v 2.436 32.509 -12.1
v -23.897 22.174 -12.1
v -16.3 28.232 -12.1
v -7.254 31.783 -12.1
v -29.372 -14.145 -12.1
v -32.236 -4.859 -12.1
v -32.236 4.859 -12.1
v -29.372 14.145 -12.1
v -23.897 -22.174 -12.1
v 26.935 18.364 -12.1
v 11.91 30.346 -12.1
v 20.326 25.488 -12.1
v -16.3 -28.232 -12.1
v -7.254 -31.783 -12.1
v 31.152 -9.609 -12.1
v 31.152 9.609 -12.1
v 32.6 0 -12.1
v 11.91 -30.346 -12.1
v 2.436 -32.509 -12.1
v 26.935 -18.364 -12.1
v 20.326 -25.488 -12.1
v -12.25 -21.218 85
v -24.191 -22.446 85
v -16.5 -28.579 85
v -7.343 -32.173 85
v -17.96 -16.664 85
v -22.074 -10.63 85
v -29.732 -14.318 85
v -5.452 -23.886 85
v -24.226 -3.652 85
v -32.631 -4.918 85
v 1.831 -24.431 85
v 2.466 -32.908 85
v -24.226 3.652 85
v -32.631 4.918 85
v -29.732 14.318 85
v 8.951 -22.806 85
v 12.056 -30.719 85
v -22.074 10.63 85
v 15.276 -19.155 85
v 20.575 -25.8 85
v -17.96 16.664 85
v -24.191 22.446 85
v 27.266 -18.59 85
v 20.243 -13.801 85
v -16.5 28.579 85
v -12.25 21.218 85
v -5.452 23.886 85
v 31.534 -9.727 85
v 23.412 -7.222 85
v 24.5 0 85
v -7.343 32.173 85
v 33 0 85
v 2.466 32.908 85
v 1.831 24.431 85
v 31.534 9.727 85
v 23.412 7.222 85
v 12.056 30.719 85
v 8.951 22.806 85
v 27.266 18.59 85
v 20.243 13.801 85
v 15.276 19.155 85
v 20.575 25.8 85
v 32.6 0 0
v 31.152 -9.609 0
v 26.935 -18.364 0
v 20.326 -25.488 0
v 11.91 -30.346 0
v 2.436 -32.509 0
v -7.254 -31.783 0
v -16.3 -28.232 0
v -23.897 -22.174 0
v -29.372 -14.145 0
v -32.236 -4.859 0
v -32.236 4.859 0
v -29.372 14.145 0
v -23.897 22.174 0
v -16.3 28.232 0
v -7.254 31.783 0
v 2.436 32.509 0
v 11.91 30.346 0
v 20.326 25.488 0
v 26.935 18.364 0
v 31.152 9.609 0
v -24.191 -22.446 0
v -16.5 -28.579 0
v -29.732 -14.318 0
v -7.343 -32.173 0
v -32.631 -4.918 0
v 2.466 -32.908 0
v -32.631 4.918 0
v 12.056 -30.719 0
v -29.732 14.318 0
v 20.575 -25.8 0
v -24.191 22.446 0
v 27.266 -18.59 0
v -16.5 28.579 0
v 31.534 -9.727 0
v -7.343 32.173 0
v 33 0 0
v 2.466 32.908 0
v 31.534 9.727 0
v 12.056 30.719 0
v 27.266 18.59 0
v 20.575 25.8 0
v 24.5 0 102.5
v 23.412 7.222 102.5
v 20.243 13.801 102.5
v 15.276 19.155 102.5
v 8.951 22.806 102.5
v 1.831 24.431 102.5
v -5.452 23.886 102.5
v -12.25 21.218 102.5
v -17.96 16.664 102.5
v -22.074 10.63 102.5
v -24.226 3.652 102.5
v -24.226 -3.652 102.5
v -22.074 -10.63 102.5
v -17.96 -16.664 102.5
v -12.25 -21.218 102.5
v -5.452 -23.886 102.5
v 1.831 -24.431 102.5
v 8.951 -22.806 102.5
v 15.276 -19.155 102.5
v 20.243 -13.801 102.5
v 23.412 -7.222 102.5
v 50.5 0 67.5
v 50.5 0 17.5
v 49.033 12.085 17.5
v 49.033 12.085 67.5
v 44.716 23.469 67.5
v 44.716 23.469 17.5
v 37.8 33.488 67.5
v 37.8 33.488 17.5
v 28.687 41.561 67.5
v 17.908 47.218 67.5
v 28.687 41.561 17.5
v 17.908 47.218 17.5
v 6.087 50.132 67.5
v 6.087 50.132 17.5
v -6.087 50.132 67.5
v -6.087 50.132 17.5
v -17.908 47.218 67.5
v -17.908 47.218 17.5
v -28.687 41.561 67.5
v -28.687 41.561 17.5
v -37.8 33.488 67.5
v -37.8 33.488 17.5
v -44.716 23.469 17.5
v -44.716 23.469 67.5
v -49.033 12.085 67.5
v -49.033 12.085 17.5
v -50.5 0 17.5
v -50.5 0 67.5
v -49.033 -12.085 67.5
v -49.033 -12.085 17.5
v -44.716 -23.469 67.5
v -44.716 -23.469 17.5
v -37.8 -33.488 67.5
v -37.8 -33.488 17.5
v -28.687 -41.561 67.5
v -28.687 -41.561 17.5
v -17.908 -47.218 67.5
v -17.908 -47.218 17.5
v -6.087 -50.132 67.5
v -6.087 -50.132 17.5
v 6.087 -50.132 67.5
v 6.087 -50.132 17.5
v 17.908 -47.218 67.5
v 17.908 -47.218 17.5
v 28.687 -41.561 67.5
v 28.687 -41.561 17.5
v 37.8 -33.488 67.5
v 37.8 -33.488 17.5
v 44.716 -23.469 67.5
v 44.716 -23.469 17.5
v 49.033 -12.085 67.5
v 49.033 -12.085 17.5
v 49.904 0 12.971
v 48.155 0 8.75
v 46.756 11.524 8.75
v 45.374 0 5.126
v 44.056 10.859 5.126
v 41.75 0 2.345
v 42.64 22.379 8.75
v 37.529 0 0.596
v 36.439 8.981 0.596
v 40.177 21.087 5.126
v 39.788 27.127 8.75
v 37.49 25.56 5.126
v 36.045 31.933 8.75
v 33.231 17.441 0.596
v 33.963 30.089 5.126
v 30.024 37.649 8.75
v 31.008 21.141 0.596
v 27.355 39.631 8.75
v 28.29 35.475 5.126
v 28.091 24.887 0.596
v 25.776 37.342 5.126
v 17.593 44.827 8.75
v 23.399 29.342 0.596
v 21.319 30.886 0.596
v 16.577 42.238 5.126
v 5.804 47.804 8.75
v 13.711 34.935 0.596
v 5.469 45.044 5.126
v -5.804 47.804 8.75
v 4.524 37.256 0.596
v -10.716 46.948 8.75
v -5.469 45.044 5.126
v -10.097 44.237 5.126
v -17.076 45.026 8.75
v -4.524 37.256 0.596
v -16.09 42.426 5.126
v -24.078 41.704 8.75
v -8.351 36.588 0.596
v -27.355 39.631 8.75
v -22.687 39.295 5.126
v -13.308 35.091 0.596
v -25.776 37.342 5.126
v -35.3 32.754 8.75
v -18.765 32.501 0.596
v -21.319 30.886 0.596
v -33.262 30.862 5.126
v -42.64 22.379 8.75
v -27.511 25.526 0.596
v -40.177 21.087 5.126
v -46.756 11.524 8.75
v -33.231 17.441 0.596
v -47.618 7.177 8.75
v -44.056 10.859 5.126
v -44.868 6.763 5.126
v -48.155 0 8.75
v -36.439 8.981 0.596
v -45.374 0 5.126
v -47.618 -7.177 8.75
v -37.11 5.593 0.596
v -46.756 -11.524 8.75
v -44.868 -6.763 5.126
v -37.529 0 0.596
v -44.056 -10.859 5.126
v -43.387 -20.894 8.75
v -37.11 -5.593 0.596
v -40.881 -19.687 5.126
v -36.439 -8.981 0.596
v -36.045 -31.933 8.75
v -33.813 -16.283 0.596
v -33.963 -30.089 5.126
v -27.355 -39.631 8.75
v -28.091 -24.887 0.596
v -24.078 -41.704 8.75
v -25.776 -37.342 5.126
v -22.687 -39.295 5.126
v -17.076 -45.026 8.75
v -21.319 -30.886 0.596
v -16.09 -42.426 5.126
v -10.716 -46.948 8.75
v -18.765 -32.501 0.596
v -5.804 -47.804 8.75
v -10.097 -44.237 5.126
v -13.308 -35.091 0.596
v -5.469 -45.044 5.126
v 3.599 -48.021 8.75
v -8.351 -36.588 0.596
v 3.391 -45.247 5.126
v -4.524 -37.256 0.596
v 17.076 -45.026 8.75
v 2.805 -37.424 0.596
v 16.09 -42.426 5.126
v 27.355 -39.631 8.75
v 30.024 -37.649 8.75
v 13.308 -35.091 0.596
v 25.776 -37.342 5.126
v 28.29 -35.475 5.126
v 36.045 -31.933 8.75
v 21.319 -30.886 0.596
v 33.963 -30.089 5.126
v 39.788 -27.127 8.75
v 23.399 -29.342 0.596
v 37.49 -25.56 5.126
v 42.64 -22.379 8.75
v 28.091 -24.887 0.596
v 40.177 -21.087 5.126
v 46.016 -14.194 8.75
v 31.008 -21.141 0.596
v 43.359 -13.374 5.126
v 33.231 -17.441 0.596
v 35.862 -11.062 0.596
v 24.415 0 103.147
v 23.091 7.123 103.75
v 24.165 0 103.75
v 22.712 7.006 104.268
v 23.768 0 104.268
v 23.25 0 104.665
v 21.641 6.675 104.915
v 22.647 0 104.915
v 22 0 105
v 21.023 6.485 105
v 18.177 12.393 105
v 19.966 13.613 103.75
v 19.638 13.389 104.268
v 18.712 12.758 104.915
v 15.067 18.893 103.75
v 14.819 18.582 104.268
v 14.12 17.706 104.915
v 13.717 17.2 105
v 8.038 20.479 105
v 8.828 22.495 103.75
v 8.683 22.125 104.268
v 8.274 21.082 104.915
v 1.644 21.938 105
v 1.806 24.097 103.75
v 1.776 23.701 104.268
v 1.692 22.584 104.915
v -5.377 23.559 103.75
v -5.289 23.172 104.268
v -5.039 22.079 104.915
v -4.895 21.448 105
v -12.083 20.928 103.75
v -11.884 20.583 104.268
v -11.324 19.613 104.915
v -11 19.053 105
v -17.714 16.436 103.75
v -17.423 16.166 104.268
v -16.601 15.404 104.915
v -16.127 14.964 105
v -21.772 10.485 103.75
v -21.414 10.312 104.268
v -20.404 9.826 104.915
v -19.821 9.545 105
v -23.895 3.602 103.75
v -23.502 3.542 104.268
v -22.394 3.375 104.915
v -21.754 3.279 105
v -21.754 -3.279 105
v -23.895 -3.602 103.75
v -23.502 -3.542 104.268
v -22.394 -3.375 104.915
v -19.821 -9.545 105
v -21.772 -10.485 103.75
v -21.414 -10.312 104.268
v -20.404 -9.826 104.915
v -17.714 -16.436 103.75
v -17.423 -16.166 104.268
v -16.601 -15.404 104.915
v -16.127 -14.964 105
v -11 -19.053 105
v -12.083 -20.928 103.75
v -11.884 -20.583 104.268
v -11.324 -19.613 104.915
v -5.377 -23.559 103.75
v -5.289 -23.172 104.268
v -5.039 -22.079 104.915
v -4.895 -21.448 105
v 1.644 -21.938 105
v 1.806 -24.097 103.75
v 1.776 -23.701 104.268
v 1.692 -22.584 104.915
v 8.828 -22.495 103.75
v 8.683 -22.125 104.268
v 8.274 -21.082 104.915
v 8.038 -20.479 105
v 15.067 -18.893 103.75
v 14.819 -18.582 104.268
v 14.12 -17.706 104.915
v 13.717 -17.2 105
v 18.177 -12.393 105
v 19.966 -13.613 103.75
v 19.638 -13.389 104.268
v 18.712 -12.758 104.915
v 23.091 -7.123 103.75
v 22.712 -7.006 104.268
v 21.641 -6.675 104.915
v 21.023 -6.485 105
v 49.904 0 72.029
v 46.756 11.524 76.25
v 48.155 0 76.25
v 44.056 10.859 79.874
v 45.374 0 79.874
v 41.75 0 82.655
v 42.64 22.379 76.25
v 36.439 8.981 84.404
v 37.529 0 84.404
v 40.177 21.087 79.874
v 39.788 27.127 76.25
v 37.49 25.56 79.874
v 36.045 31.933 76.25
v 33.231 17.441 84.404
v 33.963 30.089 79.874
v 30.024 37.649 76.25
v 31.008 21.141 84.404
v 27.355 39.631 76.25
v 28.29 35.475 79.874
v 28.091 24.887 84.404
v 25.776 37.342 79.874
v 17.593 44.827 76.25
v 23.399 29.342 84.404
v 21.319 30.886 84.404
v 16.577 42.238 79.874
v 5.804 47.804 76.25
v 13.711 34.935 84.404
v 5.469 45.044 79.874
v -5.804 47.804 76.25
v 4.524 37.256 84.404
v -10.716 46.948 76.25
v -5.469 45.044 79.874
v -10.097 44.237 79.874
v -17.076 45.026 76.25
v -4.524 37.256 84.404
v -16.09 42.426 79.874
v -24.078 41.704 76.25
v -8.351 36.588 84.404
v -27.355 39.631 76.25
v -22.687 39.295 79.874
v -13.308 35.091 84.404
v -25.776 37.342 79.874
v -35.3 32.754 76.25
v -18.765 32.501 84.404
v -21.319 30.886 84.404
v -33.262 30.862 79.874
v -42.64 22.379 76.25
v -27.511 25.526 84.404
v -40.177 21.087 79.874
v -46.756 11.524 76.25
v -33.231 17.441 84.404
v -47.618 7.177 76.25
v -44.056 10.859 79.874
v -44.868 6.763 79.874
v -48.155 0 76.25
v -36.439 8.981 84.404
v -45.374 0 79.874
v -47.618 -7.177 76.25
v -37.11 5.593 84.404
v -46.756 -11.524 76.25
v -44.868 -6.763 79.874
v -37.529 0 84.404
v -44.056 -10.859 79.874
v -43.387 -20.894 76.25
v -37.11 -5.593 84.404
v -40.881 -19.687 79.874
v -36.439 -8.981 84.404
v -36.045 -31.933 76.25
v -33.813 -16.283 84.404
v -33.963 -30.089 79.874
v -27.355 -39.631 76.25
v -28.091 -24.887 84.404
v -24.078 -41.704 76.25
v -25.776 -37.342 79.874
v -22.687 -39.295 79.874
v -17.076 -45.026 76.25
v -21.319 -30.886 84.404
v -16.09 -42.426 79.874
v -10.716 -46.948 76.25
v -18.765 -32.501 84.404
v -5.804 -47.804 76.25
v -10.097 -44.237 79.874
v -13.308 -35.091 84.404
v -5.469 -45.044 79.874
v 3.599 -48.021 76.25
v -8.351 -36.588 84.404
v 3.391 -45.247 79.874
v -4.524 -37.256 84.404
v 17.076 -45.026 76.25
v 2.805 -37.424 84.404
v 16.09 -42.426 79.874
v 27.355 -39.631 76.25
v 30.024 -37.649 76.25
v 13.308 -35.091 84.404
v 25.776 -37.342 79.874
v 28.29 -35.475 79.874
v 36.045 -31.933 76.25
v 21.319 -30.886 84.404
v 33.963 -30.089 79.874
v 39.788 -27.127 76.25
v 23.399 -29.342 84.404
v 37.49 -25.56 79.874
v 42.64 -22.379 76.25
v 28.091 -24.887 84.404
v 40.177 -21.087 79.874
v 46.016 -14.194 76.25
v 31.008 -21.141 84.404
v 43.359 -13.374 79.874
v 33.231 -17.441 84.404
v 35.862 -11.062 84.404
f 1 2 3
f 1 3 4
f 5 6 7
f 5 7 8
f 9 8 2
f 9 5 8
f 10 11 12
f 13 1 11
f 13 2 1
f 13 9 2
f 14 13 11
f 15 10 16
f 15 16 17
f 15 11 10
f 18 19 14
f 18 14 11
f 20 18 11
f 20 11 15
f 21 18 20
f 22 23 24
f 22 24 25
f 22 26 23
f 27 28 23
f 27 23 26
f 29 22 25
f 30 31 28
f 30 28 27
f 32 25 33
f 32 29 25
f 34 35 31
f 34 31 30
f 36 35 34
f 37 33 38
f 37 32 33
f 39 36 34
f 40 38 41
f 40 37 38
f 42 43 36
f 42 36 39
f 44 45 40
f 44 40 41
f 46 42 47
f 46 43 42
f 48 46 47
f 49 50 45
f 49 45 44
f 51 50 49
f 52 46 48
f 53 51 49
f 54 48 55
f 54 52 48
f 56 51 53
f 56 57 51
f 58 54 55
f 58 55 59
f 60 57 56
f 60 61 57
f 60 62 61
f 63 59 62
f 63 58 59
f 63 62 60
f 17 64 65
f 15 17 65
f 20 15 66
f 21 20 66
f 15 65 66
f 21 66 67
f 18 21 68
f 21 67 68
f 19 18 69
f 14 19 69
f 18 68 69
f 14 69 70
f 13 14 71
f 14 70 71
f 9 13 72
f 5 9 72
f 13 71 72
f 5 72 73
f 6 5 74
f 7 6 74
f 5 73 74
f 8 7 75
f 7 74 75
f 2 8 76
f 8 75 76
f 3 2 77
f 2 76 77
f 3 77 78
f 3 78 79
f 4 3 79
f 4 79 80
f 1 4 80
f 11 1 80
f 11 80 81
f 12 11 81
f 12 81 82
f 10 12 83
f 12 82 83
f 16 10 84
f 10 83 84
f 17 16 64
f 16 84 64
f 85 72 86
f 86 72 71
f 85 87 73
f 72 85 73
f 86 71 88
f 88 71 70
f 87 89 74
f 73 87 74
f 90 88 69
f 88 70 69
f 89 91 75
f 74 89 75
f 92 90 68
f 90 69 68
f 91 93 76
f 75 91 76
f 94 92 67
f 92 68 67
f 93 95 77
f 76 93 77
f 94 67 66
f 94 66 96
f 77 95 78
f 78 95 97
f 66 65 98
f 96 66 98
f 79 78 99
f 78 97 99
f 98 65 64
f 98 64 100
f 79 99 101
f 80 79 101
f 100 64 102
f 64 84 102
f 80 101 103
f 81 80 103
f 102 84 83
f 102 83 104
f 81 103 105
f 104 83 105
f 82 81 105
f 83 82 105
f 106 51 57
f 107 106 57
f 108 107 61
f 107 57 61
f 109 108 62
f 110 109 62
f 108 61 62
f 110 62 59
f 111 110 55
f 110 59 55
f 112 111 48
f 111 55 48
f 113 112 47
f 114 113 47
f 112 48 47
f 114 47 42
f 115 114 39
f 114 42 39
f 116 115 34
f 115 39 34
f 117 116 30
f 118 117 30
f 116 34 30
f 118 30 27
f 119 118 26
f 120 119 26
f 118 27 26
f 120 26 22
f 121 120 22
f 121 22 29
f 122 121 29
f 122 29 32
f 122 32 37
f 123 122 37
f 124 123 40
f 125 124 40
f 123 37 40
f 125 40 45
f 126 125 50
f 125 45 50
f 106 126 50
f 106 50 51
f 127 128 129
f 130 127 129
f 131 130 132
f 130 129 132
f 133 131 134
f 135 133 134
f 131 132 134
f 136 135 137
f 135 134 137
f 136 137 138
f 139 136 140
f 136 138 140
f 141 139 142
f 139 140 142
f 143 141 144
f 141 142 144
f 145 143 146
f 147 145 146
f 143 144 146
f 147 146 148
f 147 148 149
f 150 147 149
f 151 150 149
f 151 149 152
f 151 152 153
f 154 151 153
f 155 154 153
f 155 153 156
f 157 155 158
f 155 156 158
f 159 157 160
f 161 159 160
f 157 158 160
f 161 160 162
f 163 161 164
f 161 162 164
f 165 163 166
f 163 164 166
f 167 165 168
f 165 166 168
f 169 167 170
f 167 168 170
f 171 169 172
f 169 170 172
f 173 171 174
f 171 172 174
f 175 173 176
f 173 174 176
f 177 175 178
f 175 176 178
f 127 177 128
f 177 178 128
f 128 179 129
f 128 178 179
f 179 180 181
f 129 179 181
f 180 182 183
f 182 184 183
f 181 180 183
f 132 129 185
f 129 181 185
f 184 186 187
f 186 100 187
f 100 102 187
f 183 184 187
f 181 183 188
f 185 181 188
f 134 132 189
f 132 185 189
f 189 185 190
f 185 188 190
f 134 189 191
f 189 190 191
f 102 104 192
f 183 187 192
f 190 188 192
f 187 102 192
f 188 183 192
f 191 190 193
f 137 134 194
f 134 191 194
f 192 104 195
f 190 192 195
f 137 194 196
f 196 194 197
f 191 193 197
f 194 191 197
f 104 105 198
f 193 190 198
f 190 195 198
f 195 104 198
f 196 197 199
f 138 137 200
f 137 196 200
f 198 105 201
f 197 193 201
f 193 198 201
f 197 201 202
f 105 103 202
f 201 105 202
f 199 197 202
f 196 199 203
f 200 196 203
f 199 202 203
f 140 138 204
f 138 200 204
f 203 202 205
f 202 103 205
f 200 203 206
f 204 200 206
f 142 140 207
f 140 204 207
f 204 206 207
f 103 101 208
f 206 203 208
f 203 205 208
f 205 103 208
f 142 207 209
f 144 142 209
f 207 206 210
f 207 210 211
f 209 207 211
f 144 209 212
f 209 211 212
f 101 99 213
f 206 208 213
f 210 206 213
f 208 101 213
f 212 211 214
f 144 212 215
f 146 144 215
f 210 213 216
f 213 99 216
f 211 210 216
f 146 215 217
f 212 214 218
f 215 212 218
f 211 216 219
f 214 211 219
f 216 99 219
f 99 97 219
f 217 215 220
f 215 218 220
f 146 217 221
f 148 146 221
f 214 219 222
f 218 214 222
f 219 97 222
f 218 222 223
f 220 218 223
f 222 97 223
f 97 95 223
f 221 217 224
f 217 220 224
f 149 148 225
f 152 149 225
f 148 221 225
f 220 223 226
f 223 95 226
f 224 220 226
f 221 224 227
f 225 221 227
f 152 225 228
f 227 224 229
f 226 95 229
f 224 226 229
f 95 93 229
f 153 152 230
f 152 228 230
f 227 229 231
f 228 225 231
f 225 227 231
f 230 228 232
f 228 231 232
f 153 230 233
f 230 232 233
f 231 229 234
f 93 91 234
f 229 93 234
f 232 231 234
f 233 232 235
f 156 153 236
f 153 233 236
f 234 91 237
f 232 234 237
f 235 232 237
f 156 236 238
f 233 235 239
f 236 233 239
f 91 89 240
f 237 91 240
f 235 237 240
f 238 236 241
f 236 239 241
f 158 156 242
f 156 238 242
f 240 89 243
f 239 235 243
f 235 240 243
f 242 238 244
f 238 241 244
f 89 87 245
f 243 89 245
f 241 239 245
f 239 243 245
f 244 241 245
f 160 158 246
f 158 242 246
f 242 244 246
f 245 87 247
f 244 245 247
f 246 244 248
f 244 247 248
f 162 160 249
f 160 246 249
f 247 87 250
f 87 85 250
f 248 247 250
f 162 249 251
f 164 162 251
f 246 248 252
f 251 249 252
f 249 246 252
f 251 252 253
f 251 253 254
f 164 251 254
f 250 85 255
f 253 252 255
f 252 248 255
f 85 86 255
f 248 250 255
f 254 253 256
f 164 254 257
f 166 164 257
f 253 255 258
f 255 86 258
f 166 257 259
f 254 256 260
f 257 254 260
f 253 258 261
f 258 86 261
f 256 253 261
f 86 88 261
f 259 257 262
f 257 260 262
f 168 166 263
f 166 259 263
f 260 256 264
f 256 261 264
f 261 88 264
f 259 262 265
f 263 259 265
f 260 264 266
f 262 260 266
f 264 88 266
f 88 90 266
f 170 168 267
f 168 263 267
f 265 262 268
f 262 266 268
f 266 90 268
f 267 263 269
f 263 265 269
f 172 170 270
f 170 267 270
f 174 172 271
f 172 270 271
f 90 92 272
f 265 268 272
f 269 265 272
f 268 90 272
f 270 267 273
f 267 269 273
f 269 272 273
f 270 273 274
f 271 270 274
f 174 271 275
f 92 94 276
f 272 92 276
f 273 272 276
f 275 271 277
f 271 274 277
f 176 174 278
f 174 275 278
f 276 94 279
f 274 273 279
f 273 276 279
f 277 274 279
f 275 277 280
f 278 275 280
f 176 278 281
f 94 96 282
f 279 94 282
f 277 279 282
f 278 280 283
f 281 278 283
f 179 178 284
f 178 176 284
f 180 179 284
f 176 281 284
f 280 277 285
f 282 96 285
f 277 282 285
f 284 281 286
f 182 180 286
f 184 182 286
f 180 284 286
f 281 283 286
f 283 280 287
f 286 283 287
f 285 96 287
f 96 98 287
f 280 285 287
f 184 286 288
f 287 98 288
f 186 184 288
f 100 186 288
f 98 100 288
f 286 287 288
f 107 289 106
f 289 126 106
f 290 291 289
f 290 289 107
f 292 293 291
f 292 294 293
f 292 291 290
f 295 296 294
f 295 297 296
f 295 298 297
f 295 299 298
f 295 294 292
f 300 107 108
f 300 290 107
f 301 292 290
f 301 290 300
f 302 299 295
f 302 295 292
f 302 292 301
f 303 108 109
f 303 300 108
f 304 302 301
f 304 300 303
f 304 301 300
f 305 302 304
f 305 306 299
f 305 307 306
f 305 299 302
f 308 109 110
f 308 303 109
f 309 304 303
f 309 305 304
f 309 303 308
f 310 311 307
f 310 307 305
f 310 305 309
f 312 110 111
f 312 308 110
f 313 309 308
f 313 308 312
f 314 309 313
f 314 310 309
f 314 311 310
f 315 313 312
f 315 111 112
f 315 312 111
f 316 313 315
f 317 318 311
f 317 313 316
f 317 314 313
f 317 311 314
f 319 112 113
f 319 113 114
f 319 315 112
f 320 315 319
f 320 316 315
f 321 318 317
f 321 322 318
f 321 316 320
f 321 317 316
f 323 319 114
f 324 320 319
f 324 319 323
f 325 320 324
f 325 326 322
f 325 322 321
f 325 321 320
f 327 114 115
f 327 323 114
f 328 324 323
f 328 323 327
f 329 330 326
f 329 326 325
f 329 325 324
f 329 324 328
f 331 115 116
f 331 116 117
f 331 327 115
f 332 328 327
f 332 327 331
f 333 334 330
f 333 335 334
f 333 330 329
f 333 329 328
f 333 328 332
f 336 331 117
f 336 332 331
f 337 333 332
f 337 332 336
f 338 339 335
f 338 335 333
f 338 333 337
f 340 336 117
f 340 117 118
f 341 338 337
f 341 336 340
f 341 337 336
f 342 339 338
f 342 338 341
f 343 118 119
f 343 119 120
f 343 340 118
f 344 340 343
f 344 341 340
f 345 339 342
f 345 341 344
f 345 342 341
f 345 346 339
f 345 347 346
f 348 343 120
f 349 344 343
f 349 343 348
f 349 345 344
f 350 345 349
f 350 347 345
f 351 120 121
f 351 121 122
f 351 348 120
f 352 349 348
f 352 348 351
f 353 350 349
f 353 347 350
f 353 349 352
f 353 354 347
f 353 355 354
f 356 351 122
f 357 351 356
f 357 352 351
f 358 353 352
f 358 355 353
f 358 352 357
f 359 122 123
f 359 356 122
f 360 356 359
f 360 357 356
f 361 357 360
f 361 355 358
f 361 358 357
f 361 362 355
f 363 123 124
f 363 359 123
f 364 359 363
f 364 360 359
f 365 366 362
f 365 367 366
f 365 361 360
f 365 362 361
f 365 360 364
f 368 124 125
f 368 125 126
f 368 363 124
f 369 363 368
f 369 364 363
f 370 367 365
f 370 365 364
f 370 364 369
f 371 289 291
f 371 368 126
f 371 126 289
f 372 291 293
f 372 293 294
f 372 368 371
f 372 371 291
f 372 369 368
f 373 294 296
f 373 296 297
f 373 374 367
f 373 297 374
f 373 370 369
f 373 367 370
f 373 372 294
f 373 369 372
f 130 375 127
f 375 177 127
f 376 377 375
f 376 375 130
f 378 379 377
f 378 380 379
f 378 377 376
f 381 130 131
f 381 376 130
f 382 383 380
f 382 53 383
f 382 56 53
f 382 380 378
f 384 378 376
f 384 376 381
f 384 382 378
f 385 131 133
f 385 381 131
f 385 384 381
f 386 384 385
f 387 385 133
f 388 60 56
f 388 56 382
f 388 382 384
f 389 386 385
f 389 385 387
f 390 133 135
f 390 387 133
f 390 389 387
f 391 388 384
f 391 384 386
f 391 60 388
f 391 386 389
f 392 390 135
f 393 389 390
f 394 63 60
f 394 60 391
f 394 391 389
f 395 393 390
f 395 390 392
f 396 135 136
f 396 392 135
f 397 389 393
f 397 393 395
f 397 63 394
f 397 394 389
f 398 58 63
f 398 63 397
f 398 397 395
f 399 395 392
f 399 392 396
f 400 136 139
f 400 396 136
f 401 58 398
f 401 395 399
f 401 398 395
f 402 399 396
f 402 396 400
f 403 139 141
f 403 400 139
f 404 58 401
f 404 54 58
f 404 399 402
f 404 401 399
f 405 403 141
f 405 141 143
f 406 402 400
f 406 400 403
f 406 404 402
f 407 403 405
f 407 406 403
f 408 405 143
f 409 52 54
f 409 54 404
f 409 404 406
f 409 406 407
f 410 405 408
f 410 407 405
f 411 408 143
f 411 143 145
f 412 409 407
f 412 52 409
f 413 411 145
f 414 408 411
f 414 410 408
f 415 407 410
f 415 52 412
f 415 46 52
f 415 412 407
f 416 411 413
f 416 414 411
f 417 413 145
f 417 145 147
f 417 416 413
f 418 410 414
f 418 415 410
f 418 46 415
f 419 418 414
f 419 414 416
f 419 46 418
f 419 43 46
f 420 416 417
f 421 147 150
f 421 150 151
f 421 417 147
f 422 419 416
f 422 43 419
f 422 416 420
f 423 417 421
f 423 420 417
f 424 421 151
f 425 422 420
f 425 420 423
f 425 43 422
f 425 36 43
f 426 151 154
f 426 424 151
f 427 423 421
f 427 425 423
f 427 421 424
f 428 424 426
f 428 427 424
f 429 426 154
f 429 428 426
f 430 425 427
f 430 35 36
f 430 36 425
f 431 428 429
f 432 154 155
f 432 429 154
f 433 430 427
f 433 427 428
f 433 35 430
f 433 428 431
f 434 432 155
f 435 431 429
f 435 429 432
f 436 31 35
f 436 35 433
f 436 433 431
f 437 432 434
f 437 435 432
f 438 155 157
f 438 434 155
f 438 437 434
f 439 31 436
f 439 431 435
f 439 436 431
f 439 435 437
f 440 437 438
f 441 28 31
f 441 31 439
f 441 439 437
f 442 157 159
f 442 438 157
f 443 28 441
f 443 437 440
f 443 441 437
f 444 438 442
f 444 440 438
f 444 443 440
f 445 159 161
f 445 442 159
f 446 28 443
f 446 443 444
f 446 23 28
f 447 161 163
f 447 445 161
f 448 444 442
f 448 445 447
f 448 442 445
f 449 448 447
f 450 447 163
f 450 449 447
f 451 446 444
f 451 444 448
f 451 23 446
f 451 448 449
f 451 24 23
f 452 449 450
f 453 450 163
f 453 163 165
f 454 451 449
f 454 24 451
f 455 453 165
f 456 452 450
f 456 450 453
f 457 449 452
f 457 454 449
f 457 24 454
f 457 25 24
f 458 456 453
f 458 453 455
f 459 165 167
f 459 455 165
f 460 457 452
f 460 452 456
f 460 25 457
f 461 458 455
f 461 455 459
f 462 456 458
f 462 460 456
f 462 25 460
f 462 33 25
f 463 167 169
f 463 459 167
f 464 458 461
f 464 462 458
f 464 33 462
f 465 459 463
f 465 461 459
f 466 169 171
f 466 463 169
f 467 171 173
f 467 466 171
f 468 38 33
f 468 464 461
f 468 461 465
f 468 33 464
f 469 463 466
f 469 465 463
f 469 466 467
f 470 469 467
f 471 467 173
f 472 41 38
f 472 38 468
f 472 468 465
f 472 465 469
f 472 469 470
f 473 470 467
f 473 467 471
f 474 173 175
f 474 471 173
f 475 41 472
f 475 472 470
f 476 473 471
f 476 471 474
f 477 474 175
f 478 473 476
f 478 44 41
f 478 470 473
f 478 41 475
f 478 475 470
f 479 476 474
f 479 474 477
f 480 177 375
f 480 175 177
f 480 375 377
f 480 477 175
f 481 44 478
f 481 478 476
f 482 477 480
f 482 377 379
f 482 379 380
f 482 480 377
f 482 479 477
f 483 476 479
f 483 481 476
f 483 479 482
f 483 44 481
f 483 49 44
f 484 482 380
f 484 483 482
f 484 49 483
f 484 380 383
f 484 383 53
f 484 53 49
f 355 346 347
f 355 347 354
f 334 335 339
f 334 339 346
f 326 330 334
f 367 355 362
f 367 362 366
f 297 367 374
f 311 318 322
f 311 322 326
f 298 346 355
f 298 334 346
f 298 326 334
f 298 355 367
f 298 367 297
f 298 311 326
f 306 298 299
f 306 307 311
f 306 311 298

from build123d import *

# Parameters (mm, degrees)
F0_R     = 50.5
F1_DEPTH = 85
F2_R     = 17.5
F3_R     = 24.5
F4_DEPTH = 20
F5_R     = 2.5
F6_R     = 32.6
F7_DEPTH = 12.1


with BuildPart() as f1:
    # F0 (on Top) → F1 (new body)
    with BuildSketch(Plane.XY):
        Circle(F0_R)
    extrude(amount=F1_DEPTH)

    # F2
    f2_edges = [f1.edges().sort_by_distance(p)[0] for p in [
        (50.5, 0, 42.5),
        (-50.5, 0, 0),
        (-50.5, 0, 85),
    ]]
    fillet(f2_edges, radius=F2_R)

    # F3 (on face) → F4 (join)
    with BuildSketch(Plane.XY.offset(85)):
        Circle(F3_R)
    extrude(amount=F4_DEPTH)

    # F5
    f5_edges = [f1.edges().sort_by_distance(p)[0] for p in [
        (-24.5, 0, 105),
    ]]
    fillet(f5_edges, radius=F5_R)

    # F6 (on face) → F7 (join)
    with BuildSketch(Plane(origin=(0, 0, 0), x_dir=(1, 0, 0), z_dir=(0, 0, -1))):
        Circle(F6_R)
    extrude(amount=F7_DEPTH)


solid = f1.part
